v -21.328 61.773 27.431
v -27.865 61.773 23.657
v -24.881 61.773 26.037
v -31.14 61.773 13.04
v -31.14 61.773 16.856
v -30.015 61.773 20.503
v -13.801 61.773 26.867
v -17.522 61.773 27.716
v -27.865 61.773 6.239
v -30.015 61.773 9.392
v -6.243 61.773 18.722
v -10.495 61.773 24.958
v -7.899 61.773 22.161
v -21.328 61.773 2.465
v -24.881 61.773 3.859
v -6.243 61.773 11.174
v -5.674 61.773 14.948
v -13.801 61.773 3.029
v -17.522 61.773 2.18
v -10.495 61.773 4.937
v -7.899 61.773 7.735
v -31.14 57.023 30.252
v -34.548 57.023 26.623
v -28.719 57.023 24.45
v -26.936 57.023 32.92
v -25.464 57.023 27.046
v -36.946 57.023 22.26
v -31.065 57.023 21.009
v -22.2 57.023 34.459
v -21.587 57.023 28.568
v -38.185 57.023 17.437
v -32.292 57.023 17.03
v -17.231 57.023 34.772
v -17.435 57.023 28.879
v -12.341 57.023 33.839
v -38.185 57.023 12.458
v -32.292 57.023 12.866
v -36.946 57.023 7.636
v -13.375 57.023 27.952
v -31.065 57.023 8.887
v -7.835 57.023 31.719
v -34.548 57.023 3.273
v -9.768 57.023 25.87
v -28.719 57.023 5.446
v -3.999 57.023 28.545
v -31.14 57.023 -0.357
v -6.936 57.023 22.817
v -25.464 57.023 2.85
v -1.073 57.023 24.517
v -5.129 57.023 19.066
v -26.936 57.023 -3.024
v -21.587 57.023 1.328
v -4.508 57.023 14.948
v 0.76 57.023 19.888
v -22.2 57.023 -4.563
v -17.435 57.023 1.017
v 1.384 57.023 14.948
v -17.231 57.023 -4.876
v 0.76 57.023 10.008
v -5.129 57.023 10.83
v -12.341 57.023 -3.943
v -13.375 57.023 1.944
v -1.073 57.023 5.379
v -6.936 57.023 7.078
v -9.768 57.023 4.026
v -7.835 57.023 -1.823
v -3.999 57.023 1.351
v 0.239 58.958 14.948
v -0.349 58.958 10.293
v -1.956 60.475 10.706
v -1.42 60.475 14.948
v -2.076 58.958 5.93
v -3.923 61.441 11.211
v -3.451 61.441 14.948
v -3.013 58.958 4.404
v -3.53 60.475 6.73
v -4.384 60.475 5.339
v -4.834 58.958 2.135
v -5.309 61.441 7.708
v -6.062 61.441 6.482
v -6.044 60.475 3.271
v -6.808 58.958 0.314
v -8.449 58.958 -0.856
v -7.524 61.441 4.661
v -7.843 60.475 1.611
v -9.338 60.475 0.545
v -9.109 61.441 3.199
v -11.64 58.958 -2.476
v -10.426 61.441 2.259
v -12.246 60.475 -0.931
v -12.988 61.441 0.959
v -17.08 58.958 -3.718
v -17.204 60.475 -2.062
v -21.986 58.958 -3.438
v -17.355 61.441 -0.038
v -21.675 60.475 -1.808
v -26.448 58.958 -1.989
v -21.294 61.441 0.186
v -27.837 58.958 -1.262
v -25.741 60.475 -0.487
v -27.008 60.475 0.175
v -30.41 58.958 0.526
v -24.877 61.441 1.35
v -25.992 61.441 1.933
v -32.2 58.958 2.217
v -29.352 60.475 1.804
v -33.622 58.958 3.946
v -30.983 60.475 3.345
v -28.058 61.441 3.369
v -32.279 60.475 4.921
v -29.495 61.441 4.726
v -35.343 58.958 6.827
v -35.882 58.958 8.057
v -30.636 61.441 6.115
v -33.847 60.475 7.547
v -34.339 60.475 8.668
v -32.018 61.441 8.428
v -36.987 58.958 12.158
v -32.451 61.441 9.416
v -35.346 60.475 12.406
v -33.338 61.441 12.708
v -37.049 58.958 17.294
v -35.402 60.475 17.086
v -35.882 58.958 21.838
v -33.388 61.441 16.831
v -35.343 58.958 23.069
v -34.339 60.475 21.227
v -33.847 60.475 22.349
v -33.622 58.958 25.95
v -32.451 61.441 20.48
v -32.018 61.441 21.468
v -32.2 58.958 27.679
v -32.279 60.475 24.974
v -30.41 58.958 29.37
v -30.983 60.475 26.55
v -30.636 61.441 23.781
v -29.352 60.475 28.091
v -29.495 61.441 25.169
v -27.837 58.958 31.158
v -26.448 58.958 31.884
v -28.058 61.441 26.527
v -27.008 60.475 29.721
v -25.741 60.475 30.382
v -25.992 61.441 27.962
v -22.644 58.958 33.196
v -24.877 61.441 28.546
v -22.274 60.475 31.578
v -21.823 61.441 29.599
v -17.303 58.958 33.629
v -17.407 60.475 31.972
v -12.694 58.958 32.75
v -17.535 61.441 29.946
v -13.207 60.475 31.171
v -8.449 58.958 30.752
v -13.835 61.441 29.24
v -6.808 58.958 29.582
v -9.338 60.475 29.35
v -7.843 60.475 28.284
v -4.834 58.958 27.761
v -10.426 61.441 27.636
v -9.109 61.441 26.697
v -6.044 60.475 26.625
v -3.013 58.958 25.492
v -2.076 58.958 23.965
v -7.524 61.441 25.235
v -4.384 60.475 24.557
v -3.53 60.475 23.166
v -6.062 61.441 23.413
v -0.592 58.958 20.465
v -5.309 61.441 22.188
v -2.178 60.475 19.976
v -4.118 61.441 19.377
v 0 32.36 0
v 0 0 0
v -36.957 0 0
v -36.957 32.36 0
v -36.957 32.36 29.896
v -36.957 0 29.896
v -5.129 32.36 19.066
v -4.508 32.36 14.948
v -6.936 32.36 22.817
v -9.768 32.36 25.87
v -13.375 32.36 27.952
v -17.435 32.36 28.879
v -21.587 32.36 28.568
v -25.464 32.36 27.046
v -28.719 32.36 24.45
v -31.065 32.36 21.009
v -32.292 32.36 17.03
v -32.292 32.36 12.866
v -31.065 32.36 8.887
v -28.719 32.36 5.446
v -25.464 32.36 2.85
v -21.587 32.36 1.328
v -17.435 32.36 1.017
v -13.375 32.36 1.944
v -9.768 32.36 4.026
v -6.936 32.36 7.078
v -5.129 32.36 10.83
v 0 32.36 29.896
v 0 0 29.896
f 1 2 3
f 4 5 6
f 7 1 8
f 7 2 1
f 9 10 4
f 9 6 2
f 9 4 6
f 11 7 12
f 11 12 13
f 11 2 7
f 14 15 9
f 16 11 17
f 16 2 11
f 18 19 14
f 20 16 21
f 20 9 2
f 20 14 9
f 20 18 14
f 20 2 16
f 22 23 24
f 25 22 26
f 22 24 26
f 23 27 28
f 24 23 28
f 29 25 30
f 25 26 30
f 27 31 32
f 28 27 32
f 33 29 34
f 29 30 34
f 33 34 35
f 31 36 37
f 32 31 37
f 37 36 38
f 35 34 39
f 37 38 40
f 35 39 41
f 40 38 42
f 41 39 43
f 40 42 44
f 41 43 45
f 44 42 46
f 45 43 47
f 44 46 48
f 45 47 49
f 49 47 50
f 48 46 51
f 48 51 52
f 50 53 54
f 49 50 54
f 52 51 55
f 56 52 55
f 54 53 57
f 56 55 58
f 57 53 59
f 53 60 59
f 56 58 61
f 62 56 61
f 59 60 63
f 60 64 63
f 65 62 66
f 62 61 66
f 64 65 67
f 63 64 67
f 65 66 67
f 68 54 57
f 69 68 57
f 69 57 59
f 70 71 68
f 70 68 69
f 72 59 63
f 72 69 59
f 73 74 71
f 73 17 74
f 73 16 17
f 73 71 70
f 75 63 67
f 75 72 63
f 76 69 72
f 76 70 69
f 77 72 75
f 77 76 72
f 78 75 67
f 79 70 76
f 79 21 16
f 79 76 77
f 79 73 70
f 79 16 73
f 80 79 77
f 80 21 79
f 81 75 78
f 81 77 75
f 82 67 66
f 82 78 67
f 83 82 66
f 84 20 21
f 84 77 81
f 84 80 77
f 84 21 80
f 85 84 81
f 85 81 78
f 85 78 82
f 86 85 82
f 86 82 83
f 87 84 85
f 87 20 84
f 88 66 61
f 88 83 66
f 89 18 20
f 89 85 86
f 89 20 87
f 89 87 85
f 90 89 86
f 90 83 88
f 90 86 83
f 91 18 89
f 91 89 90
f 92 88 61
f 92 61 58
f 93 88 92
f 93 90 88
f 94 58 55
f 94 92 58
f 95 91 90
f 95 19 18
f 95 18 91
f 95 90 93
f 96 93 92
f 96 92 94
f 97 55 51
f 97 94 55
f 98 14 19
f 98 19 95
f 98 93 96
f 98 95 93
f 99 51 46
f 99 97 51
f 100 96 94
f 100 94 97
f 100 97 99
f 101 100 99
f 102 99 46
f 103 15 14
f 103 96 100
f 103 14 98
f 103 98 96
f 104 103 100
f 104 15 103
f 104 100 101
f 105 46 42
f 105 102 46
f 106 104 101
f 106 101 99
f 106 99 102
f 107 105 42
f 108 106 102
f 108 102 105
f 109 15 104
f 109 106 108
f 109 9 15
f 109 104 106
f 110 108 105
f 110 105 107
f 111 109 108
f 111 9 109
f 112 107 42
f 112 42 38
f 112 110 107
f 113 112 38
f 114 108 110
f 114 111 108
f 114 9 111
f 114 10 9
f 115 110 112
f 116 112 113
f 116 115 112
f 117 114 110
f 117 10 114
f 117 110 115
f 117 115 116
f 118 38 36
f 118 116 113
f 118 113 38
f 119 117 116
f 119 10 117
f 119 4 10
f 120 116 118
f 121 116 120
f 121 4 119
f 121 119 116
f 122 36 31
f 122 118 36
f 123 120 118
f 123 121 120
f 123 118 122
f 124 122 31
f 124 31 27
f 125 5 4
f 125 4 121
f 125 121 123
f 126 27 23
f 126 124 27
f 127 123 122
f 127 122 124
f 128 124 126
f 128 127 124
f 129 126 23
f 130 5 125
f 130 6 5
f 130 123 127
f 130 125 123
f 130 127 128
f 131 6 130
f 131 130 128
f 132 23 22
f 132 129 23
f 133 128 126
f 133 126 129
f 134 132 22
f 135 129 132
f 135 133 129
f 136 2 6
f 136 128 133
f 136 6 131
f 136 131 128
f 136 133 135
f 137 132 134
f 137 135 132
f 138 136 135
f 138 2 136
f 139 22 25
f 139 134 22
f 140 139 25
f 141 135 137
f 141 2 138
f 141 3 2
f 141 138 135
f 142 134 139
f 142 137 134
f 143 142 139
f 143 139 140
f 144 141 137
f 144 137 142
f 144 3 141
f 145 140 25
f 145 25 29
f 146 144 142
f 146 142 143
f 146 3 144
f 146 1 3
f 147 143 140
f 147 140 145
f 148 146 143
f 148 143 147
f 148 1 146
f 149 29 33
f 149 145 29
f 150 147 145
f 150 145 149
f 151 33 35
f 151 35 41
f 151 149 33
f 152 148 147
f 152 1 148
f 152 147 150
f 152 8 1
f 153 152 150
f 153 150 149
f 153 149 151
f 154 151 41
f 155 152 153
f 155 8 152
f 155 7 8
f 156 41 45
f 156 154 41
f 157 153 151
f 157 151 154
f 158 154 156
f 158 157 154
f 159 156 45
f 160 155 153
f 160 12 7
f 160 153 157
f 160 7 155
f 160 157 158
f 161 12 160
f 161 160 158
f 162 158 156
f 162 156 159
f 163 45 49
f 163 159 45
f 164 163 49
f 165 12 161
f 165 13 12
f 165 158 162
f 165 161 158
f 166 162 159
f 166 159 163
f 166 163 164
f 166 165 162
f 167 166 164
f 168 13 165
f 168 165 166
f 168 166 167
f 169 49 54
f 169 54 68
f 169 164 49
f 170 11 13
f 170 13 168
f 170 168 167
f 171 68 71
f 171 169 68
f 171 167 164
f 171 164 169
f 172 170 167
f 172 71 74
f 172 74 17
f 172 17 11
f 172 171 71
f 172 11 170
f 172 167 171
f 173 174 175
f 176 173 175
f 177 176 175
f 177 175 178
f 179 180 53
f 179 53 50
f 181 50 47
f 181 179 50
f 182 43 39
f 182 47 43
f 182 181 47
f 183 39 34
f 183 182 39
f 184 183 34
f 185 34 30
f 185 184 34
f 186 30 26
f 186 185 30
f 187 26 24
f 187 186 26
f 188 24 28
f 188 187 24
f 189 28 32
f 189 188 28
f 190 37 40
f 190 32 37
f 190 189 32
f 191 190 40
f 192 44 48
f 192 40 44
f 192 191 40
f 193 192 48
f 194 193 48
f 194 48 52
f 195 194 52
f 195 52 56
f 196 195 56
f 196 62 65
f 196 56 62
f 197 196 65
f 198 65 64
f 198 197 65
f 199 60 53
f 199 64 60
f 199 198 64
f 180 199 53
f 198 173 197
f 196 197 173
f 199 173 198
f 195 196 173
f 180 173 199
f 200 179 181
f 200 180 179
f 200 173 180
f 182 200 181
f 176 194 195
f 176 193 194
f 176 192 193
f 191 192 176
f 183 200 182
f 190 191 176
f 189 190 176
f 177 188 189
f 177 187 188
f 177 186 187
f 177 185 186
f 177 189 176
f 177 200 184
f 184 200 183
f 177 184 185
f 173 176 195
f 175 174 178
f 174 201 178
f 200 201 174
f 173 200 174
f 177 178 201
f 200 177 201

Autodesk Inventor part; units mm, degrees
ref_plane "YZ Plane" through (0, 0, 0) normal (1, 0, 0) x (0, 1, 0)
ref_plane "XZ Plane" through (0, 0, 0) normal (0, 1, 0) x (-1, 0, 0)
ref_plane "XY Plane" through (0, 0, 0) normal (0, 0, 1) x (1, 0, 0)
sketch "Sketch1" plane through (0, 0, 0) normal (0, 1, 0) x (-1, 0, 0)
  line L0 (0, 0) -> (36.957, 0)
  line L1 (36.957, 0) -> (36.957, 29.8958)
  line L2 (36.957, 29.8958) -> (0, 29.8958)
  line L3 (0, 29.8958) -> (0, 0)
  dimension "d0" = 36.957
  dimension "d1" = 29.8958
extrude "Extrusion1" add sketch "Sketch1" along normal blind 32.3596
sketch "Sketch2" plane through (0, 32.3596, 0) normal (0, 1, 0) x (1, 0, 0)
  circle A0 centre (-18.4785, -14.9479) radius 13.97
  dimension "d4" = 27.94
extrude "Extrusion2" add sketch "Sketch2" along normal blind 24.6634
sketch "Sketch3" plane through (-18.4785, 57.023, 14.9479) normal (0, 1, 0) x (1, 0, 0)
  circle A0 centre (0, 0) radius 13.97 projected
  point P0 (18.4785, 14.9479)
sketch "Sketch4" plane through (-18.4785, 57.023, 14.9479) normal (0, 1, 0) x (1, 0, 0)
  circle A0 centre (0, 0) radius 13.97 projected
  circle A1 centre (0, 0) radius 19.8628
  point P0 (18.4785, 14.9479)
  dimension "d7" = 39.7256
extrude "Extrusion3" add sketch "Sketch4" along normal blind 4.7498 contours A0 | A1
fillet "Fillet1" radius 7.62 1 edges at (-38.3413, 61.7728, 14.9479)
properties part number "Button"
